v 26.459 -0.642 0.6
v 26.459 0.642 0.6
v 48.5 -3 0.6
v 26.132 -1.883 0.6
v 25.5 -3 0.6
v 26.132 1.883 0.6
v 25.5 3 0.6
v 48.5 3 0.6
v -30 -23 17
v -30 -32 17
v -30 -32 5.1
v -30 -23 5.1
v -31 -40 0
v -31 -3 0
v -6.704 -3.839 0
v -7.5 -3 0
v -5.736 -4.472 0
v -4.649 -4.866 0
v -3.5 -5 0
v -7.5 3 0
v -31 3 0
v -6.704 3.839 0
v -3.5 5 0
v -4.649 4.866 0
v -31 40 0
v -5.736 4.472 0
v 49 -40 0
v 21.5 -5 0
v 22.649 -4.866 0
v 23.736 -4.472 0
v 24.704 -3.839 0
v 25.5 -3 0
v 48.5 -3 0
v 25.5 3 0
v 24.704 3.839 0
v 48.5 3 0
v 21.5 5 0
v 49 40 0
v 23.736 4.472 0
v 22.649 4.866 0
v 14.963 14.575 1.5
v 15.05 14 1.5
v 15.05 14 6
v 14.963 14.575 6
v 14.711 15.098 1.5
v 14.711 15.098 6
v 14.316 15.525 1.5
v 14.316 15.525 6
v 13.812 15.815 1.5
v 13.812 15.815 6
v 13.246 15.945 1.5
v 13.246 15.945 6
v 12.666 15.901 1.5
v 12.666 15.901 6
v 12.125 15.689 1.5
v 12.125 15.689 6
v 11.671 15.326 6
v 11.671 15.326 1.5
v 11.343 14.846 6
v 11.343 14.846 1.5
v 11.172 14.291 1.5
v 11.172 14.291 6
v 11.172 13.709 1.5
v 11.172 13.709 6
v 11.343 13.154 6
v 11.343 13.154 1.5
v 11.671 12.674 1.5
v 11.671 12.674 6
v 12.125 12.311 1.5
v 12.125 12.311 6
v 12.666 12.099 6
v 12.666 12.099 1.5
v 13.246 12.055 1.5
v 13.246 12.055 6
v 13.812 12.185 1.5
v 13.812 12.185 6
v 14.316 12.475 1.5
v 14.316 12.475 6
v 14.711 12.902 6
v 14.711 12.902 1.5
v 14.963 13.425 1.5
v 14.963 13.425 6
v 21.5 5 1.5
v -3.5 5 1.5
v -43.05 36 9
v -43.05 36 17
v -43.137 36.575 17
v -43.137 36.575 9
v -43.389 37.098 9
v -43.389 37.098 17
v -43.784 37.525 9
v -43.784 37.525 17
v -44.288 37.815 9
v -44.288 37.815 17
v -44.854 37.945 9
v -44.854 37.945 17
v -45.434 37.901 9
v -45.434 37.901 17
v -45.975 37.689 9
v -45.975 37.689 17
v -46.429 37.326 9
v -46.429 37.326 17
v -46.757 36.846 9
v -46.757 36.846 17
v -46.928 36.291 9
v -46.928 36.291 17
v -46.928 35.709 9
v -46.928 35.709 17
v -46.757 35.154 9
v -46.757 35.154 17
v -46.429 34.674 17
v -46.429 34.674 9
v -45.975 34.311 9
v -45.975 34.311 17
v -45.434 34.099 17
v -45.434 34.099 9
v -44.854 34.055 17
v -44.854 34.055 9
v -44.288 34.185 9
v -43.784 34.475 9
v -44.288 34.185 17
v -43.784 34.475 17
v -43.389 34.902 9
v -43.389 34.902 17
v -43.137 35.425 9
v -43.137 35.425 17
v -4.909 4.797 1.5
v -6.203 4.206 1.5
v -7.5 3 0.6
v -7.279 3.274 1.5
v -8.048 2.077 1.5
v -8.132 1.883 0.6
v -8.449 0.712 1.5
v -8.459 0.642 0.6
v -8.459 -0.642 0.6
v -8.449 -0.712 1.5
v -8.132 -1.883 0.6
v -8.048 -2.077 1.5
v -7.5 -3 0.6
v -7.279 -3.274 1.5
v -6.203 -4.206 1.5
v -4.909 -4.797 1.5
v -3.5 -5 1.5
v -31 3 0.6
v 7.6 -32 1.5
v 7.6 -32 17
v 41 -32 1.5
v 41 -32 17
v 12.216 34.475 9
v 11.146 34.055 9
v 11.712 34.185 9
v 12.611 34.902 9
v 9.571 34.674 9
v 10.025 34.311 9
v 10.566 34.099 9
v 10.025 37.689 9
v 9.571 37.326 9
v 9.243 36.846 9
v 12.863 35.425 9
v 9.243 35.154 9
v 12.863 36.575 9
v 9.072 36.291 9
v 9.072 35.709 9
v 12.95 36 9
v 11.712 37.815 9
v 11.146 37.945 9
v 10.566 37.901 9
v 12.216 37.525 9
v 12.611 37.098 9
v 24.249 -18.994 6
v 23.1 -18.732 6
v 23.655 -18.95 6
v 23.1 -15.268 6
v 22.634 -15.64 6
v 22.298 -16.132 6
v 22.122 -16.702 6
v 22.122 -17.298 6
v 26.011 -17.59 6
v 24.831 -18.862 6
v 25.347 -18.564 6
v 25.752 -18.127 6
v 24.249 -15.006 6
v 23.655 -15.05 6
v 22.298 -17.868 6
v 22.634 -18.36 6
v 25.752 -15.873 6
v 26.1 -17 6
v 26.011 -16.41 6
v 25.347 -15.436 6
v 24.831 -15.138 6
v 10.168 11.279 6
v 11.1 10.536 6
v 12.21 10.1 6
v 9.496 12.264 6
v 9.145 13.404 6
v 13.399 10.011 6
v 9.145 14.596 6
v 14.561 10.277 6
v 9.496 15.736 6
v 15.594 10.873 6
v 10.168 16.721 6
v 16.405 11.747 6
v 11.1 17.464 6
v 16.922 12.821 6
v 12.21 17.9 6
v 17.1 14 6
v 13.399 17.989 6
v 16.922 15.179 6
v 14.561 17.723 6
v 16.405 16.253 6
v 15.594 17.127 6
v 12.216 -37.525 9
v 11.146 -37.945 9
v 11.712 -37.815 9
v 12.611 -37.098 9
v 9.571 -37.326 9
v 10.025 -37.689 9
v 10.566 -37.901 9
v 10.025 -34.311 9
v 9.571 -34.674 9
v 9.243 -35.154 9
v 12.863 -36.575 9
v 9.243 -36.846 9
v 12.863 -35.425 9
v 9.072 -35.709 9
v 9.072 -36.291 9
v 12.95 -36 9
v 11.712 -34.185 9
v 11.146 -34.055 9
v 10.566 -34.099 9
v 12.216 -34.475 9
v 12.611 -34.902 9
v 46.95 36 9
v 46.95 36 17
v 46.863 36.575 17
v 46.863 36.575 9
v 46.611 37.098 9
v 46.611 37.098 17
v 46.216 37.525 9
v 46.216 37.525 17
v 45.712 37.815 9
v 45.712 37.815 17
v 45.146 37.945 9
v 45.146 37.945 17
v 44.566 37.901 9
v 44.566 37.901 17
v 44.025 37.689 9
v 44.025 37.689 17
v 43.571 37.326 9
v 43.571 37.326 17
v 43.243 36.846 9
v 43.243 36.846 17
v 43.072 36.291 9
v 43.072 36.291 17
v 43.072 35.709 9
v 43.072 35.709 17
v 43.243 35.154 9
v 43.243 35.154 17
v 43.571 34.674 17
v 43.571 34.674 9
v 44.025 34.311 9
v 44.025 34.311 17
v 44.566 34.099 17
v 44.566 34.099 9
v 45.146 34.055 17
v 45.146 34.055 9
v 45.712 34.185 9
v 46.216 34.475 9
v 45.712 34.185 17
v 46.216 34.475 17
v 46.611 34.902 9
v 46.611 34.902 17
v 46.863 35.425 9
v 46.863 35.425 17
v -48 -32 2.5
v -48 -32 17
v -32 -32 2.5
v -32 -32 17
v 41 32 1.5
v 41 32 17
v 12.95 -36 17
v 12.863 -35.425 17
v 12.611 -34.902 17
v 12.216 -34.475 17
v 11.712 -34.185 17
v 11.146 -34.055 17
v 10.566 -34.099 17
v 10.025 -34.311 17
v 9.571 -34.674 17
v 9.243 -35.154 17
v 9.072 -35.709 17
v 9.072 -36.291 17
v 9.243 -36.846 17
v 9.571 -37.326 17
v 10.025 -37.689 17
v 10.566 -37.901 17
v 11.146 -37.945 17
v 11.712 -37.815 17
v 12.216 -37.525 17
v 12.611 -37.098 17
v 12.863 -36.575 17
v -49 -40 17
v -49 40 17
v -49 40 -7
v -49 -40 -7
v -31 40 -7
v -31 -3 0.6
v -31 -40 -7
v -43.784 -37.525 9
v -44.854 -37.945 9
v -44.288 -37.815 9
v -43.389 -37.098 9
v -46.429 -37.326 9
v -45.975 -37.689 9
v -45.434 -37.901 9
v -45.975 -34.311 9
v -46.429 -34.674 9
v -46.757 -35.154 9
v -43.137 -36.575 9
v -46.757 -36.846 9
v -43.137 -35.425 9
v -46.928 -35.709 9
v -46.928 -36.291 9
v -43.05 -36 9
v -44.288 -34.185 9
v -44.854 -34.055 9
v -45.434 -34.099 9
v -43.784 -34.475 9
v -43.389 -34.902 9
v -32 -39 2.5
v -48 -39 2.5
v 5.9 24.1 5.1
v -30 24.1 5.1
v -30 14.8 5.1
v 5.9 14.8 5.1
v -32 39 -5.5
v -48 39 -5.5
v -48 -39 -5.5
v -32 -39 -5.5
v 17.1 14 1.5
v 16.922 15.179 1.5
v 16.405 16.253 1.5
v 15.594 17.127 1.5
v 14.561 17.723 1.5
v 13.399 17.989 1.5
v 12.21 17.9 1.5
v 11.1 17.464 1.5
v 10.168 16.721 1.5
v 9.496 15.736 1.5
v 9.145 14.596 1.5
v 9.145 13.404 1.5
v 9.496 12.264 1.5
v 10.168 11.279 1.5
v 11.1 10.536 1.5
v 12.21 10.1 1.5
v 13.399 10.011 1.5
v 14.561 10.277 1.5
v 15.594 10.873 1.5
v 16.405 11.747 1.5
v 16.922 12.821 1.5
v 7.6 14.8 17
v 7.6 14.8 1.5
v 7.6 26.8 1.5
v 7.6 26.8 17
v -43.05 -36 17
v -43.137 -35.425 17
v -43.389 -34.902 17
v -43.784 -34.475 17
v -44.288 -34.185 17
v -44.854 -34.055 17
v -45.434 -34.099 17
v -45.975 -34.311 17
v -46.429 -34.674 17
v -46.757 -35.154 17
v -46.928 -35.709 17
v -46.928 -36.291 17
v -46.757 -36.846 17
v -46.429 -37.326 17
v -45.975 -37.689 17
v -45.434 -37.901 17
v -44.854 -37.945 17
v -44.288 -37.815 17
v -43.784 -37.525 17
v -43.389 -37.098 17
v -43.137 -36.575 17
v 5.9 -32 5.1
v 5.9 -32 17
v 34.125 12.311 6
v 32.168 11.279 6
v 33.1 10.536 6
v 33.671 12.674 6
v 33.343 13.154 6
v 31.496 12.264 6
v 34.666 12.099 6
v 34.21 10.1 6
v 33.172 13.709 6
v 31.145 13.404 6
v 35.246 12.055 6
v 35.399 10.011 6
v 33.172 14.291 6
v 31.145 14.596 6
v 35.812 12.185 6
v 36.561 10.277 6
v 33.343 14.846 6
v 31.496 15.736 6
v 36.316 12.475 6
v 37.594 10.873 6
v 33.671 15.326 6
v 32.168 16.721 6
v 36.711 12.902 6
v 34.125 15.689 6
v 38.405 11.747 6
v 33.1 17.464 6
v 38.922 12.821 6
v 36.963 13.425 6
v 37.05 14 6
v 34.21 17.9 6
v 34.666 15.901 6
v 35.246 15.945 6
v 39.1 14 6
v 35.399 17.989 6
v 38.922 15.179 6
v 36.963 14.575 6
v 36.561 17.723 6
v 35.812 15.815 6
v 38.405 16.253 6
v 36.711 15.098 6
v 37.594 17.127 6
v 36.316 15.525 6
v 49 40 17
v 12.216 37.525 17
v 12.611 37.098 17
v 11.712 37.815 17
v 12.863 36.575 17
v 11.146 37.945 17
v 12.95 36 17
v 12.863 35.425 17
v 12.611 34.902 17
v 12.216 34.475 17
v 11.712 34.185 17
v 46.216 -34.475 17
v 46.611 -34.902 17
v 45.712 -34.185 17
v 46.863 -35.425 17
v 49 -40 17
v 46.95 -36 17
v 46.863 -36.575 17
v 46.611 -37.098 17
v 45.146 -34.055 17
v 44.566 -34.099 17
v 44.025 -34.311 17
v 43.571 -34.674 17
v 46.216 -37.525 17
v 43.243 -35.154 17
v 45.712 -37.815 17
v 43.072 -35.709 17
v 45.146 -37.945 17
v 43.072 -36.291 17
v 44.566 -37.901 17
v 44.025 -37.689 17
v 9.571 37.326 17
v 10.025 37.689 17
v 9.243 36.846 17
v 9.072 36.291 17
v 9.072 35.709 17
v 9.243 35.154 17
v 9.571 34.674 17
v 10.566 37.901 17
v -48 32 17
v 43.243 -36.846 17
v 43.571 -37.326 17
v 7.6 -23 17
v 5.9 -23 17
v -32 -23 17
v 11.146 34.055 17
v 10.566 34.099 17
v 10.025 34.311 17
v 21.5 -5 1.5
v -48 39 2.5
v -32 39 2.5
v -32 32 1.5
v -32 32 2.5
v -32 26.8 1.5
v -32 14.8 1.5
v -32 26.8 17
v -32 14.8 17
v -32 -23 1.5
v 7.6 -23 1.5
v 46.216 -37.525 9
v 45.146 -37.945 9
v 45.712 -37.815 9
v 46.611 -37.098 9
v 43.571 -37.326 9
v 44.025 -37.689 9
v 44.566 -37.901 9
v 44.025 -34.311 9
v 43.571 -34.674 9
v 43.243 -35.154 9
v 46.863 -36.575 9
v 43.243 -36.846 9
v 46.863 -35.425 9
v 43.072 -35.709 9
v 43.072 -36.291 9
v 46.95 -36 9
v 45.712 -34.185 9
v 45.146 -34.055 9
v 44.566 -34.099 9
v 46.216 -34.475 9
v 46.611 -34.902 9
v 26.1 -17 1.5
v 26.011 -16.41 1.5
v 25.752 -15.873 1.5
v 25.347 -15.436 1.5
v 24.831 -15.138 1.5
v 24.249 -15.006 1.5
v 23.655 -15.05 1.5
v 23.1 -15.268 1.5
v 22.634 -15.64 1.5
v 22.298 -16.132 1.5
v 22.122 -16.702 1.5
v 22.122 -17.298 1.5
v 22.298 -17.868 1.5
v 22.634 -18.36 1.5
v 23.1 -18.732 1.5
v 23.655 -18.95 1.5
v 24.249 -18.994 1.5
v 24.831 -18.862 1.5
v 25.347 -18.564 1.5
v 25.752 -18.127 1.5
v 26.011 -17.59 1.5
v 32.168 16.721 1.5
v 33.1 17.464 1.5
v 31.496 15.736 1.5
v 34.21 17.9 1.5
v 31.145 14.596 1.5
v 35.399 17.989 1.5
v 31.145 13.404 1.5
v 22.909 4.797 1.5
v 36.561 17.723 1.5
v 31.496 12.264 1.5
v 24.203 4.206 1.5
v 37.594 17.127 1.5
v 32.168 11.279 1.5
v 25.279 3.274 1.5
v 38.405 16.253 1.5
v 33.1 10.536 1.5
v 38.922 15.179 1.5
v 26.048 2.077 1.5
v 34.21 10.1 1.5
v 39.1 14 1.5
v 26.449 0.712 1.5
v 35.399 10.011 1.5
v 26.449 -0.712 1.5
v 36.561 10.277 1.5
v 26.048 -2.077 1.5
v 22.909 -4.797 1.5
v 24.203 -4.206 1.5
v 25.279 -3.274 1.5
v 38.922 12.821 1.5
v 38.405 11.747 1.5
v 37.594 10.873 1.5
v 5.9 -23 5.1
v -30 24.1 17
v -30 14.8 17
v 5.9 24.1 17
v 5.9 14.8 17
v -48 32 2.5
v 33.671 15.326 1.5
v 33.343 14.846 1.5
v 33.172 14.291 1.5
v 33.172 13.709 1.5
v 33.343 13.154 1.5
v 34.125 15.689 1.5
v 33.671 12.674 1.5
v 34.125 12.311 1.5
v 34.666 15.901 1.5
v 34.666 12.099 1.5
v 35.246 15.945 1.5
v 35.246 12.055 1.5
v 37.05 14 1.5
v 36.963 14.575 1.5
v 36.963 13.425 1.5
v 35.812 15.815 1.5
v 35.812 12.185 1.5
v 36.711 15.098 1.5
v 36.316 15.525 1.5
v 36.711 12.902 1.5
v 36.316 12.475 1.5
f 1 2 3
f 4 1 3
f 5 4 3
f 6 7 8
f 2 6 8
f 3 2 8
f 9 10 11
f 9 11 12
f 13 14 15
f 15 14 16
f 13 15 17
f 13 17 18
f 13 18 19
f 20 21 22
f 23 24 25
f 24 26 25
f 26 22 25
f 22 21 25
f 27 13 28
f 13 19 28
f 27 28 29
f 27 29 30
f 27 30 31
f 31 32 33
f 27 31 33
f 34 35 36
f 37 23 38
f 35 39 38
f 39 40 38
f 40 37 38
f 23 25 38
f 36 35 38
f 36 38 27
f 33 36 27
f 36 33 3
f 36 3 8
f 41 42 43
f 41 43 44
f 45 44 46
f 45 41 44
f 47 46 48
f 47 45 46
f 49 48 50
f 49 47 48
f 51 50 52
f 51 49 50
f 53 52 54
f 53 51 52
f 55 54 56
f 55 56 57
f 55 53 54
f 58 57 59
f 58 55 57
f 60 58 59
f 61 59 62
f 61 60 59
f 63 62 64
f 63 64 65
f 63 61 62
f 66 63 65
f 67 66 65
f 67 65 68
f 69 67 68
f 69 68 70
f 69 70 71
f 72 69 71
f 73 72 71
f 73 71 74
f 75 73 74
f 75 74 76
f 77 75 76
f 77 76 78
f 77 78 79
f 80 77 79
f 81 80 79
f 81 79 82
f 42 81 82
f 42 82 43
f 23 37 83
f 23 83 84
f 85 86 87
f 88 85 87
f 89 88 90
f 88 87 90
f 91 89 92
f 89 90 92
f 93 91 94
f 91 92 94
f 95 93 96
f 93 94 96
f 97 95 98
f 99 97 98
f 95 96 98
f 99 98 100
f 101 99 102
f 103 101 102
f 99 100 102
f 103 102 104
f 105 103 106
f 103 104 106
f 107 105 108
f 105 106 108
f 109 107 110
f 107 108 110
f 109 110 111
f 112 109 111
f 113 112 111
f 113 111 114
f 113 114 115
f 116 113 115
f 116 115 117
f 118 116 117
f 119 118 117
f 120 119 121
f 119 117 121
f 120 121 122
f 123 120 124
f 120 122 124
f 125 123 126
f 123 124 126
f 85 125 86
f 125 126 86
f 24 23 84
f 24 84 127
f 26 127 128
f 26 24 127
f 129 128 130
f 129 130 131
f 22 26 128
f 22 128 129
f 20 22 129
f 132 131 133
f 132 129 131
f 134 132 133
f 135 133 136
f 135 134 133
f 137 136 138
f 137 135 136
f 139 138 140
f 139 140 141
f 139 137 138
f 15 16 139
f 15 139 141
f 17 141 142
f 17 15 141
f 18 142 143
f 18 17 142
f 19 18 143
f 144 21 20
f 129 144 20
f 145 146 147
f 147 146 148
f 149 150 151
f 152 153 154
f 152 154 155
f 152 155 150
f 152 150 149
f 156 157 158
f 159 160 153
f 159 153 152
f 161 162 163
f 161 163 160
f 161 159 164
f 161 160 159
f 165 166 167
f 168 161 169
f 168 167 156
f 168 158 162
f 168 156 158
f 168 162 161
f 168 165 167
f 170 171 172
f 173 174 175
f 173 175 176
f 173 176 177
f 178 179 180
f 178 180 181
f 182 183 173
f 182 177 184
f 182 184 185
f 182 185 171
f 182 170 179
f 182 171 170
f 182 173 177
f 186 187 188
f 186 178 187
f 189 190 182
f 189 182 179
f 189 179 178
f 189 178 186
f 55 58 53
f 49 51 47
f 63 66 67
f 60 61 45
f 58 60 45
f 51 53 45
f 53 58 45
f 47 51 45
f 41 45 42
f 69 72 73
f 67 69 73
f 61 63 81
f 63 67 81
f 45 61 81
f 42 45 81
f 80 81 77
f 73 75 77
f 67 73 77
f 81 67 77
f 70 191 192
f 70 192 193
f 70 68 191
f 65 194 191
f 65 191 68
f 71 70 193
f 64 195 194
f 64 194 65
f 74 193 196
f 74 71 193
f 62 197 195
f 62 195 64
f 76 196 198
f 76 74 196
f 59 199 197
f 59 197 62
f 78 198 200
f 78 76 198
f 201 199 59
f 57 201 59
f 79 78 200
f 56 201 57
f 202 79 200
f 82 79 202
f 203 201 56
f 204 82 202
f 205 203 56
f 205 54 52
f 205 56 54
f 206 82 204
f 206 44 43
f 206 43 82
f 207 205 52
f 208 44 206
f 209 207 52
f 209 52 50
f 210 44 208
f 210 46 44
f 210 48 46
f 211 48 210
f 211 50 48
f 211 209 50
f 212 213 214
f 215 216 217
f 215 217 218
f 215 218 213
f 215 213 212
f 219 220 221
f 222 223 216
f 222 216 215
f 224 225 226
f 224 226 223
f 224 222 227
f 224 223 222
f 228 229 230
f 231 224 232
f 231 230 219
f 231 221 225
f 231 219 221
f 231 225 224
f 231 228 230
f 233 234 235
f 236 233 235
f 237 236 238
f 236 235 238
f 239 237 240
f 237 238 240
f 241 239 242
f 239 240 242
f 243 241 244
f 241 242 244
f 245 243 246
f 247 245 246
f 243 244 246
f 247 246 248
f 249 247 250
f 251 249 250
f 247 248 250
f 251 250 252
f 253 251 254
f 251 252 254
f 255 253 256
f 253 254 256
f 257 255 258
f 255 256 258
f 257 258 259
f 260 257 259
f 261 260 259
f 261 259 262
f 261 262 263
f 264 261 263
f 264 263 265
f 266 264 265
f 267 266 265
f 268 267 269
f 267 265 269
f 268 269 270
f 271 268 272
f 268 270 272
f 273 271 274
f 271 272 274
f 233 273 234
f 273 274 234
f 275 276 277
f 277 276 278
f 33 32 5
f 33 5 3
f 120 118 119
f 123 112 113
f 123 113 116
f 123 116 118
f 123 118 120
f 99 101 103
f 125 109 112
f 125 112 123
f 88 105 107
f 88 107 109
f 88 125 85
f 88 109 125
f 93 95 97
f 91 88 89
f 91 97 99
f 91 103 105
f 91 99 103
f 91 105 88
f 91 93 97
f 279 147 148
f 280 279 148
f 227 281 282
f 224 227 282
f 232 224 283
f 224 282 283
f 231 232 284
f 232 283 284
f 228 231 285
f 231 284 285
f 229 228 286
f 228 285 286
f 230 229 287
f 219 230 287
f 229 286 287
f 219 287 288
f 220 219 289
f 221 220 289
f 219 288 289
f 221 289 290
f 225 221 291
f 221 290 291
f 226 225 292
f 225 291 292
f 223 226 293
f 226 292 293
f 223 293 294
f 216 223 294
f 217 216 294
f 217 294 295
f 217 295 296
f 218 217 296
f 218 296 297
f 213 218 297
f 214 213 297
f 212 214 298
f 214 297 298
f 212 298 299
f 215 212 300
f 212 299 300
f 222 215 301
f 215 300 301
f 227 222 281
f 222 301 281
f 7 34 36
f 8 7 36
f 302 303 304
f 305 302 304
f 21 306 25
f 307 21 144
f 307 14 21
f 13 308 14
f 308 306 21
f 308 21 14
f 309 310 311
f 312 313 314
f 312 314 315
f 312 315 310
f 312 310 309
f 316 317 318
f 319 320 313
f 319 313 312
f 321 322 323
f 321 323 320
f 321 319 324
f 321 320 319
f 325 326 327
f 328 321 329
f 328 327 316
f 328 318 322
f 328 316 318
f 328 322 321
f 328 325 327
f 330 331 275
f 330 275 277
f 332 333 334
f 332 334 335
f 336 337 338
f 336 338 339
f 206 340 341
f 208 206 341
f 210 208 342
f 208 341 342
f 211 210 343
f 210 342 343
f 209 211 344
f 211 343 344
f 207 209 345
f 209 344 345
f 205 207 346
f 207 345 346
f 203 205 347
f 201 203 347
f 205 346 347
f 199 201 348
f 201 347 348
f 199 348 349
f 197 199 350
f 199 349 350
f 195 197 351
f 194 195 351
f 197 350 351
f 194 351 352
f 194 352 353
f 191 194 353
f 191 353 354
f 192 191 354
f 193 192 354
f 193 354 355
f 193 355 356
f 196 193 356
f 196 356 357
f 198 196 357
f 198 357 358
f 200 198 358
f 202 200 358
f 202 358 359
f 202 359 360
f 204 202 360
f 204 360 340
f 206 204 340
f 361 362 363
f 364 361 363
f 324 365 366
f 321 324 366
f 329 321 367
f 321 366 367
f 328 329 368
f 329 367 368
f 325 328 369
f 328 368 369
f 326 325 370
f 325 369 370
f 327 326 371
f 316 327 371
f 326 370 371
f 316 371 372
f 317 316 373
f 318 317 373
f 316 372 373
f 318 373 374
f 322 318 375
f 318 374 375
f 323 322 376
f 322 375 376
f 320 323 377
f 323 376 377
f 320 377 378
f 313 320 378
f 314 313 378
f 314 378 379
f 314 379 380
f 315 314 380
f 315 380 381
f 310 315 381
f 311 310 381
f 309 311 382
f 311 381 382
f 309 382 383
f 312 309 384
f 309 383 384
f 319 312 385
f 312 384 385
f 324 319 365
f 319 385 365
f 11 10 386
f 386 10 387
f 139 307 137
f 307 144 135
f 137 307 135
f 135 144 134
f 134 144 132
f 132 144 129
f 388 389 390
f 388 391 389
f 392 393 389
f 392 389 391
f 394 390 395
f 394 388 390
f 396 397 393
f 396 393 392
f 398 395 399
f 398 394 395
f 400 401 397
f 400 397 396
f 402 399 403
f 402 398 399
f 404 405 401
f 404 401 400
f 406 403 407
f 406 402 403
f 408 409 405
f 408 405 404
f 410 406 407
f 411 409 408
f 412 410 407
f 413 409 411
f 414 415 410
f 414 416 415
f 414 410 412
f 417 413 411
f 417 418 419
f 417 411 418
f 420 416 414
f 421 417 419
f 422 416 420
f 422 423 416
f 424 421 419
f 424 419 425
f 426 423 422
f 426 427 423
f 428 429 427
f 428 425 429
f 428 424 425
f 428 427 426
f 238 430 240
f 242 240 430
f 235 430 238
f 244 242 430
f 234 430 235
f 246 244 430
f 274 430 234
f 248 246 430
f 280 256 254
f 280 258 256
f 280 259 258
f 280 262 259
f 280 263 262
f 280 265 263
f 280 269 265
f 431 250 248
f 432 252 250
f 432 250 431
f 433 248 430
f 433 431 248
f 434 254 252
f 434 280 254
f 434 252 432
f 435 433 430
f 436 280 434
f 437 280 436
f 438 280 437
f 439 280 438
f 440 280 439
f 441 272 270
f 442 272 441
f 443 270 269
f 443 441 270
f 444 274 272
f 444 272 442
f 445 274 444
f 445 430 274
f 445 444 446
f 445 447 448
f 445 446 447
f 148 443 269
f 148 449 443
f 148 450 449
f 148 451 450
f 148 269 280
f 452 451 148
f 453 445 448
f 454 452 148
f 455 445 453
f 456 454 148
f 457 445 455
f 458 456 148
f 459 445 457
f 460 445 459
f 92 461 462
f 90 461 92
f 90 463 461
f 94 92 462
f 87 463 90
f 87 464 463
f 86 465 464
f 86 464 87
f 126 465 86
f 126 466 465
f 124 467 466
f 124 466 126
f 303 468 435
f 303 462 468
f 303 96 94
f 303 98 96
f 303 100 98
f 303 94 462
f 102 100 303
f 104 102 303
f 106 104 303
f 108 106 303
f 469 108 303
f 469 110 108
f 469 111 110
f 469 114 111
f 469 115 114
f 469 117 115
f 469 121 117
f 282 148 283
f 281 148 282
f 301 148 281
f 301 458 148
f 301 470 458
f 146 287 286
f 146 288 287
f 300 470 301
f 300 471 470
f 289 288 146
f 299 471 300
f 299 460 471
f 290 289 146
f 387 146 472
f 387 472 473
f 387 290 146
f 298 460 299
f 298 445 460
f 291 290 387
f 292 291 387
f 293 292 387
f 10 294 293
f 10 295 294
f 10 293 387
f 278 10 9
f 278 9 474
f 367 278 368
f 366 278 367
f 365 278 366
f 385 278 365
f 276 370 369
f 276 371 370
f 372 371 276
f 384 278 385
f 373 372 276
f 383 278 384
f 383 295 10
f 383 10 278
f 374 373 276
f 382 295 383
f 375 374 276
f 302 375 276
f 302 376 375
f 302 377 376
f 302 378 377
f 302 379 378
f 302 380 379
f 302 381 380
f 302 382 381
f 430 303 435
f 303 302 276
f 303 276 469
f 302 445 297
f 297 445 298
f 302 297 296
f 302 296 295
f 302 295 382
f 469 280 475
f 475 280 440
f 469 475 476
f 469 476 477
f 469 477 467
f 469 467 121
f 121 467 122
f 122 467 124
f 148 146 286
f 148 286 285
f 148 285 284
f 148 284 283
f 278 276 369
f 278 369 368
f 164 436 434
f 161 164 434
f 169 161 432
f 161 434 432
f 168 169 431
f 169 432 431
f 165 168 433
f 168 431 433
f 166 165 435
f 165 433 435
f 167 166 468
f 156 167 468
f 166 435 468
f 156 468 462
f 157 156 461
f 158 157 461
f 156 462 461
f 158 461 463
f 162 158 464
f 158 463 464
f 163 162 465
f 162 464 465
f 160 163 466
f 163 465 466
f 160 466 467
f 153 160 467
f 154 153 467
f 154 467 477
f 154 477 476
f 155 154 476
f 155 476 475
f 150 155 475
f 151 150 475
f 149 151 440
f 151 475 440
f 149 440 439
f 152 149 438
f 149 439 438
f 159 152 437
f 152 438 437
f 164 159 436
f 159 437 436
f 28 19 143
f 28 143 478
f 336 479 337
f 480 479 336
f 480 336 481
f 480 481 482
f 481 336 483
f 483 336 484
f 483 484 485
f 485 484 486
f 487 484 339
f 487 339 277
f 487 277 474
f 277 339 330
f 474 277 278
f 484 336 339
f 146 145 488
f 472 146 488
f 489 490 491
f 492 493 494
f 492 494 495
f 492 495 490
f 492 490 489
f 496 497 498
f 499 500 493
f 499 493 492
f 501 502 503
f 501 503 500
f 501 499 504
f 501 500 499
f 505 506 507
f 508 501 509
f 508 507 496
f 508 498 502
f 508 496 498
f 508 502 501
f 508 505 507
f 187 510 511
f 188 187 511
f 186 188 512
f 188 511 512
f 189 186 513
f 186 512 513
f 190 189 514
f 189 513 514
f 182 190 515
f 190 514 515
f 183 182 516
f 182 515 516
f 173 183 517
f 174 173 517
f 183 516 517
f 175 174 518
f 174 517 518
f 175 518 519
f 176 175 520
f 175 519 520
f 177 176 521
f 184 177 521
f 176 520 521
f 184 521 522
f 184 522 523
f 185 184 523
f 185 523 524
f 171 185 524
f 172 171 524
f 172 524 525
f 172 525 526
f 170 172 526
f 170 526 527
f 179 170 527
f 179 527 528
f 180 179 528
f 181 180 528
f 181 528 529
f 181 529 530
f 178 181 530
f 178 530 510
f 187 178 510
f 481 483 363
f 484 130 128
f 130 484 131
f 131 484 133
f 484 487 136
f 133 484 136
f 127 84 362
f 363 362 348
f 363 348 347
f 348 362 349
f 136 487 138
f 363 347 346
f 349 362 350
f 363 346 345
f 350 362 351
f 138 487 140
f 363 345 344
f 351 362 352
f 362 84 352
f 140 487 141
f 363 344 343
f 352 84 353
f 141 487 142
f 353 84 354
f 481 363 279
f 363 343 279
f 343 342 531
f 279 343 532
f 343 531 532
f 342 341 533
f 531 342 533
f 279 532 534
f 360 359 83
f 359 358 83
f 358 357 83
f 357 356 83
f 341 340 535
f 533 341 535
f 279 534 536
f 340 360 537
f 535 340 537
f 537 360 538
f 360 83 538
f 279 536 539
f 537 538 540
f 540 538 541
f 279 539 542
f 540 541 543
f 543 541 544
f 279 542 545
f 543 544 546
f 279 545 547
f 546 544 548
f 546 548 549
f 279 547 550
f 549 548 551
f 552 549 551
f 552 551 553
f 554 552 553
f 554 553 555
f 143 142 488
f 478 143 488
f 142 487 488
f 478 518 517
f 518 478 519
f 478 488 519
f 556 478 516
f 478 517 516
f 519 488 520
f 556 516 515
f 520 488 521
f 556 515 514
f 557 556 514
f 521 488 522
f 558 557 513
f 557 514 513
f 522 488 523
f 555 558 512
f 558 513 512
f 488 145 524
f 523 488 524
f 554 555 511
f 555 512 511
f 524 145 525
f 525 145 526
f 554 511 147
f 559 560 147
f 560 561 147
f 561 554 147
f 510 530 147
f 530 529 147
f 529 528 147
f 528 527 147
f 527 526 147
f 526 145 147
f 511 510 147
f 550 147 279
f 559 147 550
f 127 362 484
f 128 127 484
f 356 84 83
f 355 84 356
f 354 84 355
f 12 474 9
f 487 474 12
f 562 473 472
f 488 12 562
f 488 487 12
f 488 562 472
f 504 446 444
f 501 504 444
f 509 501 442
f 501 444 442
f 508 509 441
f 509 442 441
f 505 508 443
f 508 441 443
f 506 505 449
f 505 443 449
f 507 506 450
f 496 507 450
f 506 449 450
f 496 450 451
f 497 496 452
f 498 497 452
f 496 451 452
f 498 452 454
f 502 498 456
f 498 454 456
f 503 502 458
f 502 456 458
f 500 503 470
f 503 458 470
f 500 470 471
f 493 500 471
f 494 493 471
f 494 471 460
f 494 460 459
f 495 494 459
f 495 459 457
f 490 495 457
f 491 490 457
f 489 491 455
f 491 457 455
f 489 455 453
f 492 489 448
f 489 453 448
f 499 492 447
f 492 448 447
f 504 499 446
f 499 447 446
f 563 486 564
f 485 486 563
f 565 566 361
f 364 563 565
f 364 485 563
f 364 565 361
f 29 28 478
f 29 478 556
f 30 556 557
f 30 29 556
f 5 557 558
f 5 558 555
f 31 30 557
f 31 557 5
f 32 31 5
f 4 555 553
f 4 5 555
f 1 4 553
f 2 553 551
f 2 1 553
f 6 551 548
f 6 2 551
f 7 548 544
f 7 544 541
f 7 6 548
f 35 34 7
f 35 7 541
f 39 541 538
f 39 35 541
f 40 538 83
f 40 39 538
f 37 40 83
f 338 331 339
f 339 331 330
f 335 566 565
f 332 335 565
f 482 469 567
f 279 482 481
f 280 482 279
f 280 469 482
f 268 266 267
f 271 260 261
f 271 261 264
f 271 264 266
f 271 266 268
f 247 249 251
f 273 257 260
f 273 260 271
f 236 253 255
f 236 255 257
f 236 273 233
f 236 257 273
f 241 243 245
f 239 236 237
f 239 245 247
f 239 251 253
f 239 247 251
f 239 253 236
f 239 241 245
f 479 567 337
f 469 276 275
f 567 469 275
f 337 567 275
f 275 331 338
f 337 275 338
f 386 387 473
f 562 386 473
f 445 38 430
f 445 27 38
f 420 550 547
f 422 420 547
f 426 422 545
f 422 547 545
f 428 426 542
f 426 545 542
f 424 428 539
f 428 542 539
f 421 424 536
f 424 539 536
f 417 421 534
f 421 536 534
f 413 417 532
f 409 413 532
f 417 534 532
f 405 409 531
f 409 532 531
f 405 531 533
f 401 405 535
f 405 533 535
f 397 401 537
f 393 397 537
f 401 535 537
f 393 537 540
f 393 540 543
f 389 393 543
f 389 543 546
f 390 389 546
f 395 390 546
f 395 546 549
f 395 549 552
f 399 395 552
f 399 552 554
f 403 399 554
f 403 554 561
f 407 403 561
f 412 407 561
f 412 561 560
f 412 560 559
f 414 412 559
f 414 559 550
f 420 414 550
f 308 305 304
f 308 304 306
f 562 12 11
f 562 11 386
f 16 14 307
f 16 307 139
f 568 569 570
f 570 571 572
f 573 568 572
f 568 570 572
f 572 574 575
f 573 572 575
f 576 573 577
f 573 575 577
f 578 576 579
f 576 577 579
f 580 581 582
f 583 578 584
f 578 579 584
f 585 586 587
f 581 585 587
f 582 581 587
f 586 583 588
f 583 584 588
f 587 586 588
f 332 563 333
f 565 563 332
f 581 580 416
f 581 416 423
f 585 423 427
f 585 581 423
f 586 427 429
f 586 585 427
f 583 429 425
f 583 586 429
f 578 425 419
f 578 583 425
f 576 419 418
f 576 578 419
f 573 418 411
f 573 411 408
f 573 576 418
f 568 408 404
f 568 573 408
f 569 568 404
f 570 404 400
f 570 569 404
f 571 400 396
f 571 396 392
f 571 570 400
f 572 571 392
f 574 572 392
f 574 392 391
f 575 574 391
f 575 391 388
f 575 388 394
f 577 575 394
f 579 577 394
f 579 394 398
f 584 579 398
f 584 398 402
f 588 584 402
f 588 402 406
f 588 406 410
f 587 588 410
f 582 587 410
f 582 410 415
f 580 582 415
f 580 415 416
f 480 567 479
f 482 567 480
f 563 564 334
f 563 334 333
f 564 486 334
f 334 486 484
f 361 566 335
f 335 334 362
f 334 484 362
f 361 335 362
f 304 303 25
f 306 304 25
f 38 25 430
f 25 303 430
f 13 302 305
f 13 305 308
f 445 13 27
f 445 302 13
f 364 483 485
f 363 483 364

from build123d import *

# Parameters (mm, degrees)
PAD_DEPTH       = 40
POCKET_DEPTH    = 32
POCKET001_DEPTH = 1.5
SKETCH007_R     = 4
SKETCH007_R_2   = 1.95
SKETCH007_R_3   = 2
PAD005_DEPTH    = 6
SKETCH008_W     = 16
SKETCH008_H     = 8
POCKET002_DEPTH = 39
SKETCH013_R     = 1.95
POCKET003_DEPTH = 8
SKETCH018_W     = 39.6
SKETCH018_H     = 12
SKETCH018_H_2   = 9
PAD012_DEPTH    = 17
SKETCH019_W     = 35.9
SKETCH019_H     = 56.1
POCKET006_DEPTH = 11.9
SKETCH023_W     = 79.5
SKETCH023_H     = 6
POCKET007_DEPTH = 0.6


with BuildPart() as part:
    # Sketch → Pad (new body, symmetric)
    with BuildSketch(Plane.XZ):
        Polygon((-49, 17), (-49, -7), (-31, -7), (-31, 0), (49, 0), (49, 17), align=None)
    extrude(amount=PAD_DEPTH, both=True)

    # Sketch001 → Pocket (cut, symmetric)
    with BuildSketch(Plane.XZ):
        Polygon((-32, 1.5), (41, 1.5), (41, 18.5), (-48, 18.5), (-48, -5.5), (-32, -5.5), align=None)
    extrude(amount=POCKET_DEPTH, both=True, mode=Mode.SUBTRACT)

    # Sketch004 → Pocket001 (cut)
    with BuildSketch(Plane.XY):
        with BuildLine():
            ThreePointArc((-3.5, 5), (-8.5, 0), (-3.5, -5))
            Line((-3.5, -5), (21.5, -5))
            ThreePointArc((21.5, -5), (26.5, 0), (21.5, 5))
            Line((21.5, 5), (-3.5, 5))
        make_face()
    extrude(amount=POCKET001_DEPTH, mode=Mode.SUBTRACT)

    # Sketch007 → Pad005 (join)
    with BuildSketch(Plane.XY):
        with Locations((13.1, 14)):
            Circle(SKETCH007_R)
        with Locations((13.1, 14)):
            Circle(SKETCH007_R_2, mode=Mode.SUBTRACT)
        with Locations((35.1, 14)):
            Circle(SKETCH007_R)
        with Locations((35.1, 14)):
            Circle(SKETCH007_R_2, mode=Mode.SUBTRACT)
        with Locations((24.1, -17)):
            Circle(SKETCH007_R_3)
    extrude(amount=PAD005_DEPTH)

    # Sketch008 → Pocket002 (cut, symmetric)
    with BuildSketch(Plane.XZ):
        with Locations((-40, -1.5)):
            Rectangle(SKETCH008_W, SKETCH008_H)
    extrude(amount=POCKET002_DEPTH, both=True, mode=Mode.SUBTRACT)

    # Sketch013 (on DatumPlane) → Pocket003 (cut)
    with BuildSketch(Plane.XY.offset(17)):
        with Locations((-45, 36)):
            Circle(SKETCH013_R)
        with Locations((11, 36)):
            Circle(SKETCH013_R)
        with Locations((45, 36)):
            Circle(SKETCH013_R)
        with Locations((45, -36)):
            Circle(SKETCH013_R)
        with Locations((11, -36)):
            Circle(SKETCH013_R)
        with Locations((-45, -36)):
            Circle(SKETCH013_R)
    extrude(amount=-POCKET003_DEPTH, mode=Mode.SUBTRACT)

    # Sketch018 → Pad012 (join)
    with BuildSketch(Plane.XY):
        with Locations((-12.2, 20.8)):
            Rectangle(SKETCH018_W, SKETCH018_H)
        with Locations((-12.2, -27.5)):
            Rectangle(SKETCH018_W, SKETCH018_H_2)
    extrude(amount=PAD012_DEPTH)

    # Sketch019 (on DatumPlane) → Pocket006 (cut)
    with BuildSketch(Plane.XY.offset(17)):
        with Locations((-12.05, -3.95)):
            Rectangle(SKETCH019_W, SKETCH019_H)
    extrude(amount=-POCKET006_DEPTH, mode=Mode.SUBTRACT)

    # Sketch023 → Pocket007 (cut)
    with BuildSketch(Plane.XY):
        with Locations((8.75, 0)):
            Rectangle(SKETCH023_W, SKETCH023_H)
    extrude(amount=POCKET007_DEPTH, mode=Mode.SUBTRACT)


solid = part.part
